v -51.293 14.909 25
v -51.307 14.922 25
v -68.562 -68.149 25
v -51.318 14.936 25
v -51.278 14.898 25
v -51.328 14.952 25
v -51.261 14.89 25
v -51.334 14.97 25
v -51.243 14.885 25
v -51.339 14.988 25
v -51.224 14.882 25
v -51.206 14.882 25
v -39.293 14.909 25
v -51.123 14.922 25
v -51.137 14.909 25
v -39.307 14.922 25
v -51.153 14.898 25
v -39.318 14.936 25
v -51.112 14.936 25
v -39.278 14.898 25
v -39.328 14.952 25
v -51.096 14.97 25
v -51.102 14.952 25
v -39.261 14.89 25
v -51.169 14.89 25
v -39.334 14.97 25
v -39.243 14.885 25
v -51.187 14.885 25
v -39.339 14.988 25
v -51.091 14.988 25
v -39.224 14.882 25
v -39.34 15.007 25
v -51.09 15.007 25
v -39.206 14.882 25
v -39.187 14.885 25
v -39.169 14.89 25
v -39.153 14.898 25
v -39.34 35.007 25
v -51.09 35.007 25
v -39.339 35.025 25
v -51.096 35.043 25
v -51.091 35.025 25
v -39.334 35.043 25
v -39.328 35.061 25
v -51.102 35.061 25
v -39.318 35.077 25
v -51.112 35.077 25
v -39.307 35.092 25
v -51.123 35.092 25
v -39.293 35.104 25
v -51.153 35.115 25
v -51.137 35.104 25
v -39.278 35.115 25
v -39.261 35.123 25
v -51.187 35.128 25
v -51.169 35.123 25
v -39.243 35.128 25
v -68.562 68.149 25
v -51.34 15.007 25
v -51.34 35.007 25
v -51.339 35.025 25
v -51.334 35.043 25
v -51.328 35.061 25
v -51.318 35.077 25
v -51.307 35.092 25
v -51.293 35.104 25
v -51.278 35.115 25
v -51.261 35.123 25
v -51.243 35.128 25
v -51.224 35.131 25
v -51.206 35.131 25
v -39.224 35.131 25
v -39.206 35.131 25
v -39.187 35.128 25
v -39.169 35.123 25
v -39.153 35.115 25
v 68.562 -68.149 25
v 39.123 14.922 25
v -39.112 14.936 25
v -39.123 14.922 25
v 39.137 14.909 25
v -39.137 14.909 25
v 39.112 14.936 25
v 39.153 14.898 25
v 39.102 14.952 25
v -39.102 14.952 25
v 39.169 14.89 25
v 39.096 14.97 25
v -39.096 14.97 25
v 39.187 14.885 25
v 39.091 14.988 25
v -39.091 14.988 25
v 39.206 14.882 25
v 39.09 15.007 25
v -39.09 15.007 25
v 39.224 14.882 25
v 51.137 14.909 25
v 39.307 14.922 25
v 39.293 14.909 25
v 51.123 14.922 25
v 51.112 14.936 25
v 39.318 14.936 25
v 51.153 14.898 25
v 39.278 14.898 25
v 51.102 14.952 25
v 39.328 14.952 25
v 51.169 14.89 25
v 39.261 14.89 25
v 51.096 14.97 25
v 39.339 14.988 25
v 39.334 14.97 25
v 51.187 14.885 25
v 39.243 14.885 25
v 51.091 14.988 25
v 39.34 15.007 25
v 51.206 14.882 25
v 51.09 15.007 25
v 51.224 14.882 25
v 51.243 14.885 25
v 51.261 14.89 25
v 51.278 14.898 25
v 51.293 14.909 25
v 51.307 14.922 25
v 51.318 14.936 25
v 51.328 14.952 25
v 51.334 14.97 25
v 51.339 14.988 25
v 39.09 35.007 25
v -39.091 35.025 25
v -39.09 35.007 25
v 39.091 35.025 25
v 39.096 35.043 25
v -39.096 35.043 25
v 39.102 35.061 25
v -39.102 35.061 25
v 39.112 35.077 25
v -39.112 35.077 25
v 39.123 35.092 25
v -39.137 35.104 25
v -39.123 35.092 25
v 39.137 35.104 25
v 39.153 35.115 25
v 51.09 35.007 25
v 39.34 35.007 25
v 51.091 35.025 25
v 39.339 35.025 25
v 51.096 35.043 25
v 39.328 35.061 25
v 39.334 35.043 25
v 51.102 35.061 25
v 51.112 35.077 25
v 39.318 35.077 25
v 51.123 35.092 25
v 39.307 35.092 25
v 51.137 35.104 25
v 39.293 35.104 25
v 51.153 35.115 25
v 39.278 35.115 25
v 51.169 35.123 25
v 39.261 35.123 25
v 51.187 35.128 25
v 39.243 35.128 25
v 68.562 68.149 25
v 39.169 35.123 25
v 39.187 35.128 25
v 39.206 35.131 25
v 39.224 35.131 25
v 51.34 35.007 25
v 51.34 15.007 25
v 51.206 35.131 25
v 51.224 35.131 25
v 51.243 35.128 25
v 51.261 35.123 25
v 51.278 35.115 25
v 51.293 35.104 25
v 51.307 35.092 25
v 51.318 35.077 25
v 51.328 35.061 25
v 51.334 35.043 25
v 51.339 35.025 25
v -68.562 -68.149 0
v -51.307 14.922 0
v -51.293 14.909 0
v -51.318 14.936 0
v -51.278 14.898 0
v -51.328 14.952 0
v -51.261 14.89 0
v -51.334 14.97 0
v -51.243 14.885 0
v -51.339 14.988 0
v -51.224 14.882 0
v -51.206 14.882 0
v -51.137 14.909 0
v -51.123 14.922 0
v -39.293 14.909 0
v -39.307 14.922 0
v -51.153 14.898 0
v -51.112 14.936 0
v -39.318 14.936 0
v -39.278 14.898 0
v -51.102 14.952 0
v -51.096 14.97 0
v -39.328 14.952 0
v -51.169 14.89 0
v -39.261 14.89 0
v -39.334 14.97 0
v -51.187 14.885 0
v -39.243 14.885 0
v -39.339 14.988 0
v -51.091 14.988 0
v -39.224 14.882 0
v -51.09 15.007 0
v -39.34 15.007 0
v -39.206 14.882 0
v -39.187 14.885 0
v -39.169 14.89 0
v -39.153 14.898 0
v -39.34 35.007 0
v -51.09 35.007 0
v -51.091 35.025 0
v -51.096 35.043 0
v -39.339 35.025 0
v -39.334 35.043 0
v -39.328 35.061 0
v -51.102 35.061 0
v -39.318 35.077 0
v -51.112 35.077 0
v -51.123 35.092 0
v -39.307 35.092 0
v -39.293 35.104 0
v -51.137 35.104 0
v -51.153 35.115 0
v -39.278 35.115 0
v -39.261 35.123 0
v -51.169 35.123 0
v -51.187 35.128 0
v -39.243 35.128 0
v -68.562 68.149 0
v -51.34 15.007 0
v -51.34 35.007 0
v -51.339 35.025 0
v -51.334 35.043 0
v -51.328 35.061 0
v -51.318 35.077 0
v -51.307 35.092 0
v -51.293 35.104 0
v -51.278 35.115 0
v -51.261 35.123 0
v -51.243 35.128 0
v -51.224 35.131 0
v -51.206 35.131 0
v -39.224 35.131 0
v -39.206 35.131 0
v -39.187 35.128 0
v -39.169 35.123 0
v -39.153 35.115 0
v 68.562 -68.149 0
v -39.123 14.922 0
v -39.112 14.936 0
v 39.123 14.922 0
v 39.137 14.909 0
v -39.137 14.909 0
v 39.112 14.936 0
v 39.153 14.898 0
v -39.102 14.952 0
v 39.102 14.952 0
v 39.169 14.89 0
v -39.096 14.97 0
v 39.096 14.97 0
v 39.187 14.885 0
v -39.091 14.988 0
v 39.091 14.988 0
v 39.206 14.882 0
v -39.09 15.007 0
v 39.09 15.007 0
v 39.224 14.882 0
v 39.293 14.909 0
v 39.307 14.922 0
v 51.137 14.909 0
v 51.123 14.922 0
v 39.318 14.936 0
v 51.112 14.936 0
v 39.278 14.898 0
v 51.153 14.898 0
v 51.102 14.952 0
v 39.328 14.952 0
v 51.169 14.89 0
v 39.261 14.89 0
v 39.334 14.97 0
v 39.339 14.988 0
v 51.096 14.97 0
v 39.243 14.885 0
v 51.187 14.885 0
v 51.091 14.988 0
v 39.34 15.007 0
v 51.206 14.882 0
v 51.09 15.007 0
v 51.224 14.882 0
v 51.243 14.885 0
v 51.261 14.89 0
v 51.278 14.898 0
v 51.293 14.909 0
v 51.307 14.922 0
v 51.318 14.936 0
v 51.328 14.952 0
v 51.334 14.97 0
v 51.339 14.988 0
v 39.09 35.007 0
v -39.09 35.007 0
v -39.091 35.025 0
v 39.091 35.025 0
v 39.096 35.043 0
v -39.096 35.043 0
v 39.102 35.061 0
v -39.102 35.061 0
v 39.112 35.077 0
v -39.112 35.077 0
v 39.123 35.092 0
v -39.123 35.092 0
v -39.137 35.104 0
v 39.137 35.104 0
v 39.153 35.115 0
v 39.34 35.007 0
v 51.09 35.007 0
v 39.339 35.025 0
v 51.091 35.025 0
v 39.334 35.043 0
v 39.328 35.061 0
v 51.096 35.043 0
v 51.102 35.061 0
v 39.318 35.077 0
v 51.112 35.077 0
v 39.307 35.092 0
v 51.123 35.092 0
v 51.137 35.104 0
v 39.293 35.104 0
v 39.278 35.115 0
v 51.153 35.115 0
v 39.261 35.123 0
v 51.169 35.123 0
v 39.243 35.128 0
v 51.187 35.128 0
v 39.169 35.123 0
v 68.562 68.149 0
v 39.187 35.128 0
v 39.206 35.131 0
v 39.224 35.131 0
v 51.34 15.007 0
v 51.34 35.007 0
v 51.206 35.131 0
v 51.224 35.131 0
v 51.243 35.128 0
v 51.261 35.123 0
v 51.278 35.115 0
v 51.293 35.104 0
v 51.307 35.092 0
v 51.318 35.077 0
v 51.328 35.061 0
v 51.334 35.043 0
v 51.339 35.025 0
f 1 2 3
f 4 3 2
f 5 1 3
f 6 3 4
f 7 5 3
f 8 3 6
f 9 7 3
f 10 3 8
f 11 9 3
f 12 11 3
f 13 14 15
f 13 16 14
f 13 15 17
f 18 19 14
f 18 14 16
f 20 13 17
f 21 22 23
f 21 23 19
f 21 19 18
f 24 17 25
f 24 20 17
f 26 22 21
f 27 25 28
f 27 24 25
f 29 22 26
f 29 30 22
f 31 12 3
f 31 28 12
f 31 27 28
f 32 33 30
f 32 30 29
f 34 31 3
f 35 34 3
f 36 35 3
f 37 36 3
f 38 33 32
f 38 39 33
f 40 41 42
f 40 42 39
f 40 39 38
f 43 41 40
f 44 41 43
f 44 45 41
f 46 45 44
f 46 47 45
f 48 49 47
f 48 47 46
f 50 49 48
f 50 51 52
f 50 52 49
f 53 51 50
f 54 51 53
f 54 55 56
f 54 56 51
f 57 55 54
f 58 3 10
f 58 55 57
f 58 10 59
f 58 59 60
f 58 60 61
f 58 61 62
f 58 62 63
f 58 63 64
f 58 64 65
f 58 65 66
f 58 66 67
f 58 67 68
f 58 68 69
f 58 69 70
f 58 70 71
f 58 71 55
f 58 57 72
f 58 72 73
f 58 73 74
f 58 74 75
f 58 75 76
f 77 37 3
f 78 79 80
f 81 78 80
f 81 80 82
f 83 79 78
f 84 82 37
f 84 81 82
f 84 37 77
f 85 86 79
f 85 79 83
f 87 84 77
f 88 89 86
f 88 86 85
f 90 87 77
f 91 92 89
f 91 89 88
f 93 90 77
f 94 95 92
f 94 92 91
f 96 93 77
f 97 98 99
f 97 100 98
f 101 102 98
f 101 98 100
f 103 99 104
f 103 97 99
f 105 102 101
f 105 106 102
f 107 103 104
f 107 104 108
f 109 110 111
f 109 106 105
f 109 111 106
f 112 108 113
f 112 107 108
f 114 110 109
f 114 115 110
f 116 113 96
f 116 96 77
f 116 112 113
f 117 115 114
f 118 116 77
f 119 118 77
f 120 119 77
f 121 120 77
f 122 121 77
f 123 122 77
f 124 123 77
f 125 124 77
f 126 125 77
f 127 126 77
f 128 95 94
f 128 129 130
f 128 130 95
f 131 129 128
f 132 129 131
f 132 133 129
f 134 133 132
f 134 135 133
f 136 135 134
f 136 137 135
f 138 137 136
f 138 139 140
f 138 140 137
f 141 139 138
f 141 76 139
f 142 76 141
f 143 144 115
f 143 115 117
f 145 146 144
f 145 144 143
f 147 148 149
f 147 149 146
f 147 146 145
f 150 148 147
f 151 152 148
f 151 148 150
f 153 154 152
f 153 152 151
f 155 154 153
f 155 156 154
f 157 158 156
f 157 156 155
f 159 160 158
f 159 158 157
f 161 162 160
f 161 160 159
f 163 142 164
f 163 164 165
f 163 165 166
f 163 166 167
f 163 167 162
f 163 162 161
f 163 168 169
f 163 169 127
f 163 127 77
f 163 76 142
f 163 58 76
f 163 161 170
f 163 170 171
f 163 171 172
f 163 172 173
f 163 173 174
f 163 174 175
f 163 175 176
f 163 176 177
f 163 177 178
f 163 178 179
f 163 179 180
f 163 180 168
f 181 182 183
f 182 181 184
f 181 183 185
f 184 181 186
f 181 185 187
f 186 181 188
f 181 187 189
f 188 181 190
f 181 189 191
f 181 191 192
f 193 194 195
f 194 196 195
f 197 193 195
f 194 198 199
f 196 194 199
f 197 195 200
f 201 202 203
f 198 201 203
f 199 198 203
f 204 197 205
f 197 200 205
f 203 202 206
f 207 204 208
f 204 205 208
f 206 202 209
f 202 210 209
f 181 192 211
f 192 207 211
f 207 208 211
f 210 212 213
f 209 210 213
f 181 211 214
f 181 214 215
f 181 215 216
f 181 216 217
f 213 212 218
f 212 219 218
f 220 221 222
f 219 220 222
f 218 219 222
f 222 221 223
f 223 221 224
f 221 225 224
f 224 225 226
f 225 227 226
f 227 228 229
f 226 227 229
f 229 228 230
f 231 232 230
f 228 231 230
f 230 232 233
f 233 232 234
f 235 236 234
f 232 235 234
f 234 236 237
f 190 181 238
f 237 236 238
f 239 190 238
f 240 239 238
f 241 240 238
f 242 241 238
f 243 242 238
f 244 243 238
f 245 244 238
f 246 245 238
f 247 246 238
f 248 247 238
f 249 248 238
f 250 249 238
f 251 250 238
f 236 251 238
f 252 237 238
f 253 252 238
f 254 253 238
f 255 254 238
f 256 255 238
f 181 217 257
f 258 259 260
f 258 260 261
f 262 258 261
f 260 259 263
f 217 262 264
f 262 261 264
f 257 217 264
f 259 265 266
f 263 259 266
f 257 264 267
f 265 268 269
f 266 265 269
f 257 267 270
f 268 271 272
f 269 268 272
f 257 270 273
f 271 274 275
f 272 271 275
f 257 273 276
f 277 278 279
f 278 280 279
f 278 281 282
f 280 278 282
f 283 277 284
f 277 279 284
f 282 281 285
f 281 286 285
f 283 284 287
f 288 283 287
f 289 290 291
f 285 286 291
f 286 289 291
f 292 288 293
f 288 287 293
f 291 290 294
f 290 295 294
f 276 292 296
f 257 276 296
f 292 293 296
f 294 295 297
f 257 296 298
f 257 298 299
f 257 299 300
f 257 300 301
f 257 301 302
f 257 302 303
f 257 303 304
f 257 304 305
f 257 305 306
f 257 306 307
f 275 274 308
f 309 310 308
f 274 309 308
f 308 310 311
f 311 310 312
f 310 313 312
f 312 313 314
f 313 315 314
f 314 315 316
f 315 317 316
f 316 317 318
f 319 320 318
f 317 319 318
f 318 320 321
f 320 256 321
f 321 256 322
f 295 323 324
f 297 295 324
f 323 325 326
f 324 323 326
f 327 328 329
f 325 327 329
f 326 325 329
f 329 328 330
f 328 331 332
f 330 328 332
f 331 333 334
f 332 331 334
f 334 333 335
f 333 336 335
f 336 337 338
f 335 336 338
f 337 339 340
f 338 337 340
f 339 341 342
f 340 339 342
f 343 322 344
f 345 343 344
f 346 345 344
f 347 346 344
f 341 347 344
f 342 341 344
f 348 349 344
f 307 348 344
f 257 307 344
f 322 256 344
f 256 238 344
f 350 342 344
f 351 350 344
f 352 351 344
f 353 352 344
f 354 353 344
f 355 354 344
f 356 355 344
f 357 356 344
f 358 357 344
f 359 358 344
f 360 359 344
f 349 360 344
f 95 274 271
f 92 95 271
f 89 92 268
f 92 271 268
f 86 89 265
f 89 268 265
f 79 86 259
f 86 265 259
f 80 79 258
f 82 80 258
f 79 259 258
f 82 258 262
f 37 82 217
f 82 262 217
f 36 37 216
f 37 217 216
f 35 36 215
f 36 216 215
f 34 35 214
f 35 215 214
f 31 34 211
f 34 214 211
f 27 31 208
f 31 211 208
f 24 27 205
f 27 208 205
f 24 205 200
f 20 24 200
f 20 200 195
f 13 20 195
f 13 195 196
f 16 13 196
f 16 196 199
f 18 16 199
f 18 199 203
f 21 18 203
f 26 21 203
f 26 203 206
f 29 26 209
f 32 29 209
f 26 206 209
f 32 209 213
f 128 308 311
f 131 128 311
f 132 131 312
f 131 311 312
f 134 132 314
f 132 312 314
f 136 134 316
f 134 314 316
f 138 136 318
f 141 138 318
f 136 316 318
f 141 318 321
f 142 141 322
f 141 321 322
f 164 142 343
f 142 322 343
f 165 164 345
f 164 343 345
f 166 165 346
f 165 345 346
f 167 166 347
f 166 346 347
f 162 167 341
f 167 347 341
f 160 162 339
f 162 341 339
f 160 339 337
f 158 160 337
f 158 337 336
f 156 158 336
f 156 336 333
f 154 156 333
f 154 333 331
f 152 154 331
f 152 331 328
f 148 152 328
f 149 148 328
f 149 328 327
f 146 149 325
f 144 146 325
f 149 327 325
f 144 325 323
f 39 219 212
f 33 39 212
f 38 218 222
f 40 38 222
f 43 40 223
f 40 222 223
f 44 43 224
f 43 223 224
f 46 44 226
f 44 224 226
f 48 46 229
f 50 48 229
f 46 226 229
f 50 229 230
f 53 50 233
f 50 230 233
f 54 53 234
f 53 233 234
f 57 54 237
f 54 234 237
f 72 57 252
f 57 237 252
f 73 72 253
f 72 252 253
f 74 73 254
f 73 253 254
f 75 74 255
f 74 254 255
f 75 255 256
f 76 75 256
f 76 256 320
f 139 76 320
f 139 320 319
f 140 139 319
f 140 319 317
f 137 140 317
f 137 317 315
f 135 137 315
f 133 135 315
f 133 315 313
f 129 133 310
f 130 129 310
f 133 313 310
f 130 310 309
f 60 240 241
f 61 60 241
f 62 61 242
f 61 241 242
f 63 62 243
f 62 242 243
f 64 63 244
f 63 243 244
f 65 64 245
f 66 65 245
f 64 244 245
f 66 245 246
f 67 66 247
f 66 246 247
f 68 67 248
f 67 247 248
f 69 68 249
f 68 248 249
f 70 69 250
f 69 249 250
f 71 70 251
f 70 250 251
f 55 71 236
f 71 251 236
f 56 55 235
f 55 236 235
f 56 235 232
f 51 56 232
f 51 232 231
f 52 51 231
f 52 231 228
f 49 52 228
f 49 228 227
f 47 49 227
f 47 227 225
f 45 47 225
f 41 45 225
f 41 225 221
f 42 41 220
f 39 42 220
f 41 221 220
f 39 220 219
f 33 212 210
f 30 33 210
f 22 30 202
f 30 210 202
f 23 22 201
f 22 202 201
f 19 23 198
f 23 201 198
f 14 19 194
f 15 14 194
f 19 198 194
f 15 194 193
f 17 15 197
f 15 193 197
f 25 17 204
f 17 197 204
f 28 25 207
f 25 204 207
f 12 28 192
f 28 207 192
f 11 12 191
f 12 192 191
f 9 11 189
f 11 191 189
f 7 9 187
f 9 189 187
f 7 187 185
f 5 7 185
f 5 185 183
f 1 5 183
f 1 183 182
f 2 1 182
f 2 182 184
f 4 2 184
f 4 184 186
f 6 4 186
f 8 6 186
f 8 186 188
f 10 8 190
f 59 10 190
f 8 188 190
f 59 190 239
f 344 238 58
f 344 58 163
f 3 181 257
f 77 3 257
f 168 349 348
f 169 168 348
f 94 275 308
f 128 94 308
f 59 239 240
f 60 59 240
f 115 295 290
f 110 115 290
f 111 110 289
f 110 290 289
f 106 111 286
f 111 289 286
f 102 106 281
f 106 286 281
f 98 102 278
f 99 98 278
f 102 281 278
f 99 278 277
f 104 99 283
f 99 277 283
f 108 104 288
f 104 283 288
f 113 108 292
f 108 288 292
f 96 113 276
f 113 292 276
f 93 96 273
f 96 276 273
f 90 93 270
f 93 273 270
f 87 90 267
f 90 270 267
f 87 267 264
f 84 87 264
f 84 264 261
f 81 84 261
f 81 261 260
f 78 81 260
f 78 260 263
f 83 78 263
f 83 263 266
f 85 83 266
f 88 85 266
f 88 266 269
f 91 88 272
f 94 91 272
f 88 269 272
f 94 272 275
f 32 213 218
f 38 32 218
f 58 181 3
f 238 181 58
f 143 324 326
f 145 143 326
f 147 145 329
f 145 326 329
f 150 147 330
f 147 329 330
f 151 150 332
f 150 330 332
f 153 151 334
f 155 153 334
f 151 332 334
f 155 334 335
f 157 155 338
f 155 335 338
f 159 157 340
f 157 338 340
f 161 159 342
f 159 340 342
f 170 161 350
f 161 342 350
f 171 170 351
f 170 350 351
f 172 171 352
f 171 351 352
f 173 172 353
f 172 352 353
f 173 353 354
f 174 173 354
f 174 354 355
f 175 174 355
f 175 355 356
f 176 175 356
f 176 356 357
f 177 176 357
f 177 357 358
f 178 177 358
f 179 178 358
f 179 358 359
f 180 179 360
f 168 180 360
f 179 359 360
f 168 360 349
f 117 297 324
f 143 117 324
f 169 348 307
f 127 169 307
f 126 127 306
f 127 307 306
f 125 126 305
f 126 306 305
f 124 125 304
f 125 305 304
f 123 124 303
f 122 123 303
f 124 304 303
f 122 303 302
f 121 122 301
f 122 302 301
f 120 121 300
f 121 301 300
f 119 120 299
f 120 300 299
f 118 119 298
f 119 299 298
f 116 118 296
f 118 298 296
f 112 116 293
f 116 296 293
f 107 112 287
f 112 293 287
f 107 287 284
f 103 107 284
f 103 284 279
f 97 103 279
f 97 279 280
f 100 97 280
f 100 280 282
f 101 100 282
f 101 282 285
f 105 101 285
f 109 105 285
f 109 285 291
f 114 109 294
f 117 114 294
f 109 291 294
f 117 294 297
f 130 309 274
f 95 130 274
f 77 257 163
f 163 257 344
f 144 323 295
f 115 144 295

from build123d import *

# Parameters (mm, degrees)
F0_W     = 137.1241360903
F0_H     = 136.2980902195
F1_DEPTH = 25


with BuildPart() as f1:
    # F0 (on Top) → F1 (new body)
    with BuildSketch(Plane.XY):
        Rectangle(F0_W, F0_H)
        with BuildLine():
            Line((-51.3400377035, 15.006557107), (-51.3400377035, 35.006557107))
            ThreePointArc((-51.3400377035, 35.006557107), (-51.2150377035, 35.131557107), (-51.0900377035, 35.006557107))
            Line((-51.0900377035, 35.006557107), (-51.0900377035, 15.006557107))
            ThreePointArc((-51.0900377035, 15.006557107), (-51.2150377035, 14.881557107), (-51.3400377035, 15.006557107))
        make_face(mode=Mode.SUBTRACT)
        with BuildLine():
            Line((-39.3400377035, 15.006557107), (-39.3400377035, 35.006557107))
            ThreePointArc((-39.3400377035, 35.006557107), (-39.2150377035, 35.131557107), (-39.0900377035, 35.006557107))
            Line((-39.0900377035, 35.006557107), (-39.0900377035, 15.006557107))
            ThreePointArc((-39.0900377035, 15.006557107), (-39.2150377035, 14.881557107), (-39.3400377035, 15.006557107))
        make_face(mode=Mode.SUBTRACT)
        with BuildLine():
            ThreePointArc((39.0900377035, 35.006557107), (39.2150377035, 35.131557107), (39.3400377035, 35.006557107))
            Line((39.3400377035, 35.006557107), (39.3400377035, 15.006557107))
            ThreePointArc((39.3400377035, 15.006557107), (39.2150377035, 14.881557107), (39.0900377035, 15.006557107))
            Line((39.0900377035, 15.006557107), (39.0900377035, 35.006557107))
        make_face(mode=Mode.SUBTRACT)
        with BuildLine():
            ThreePointArc((51.3400377035, 15.006557107), (51.2150377035, 14.881557107), (51.0900377035, 15.006557107))
            Line((51.0900377035, 15.006557107), (51.0900377035, 35.006557107))
            ThreePointArc((51.0900377035, 35.006557107), (51.2150377035, 35.131557107), (51.3400377035, 35.006557107))
            Line((51.3400377035, 35.006557107), (51.3400377035, 15.006557107))
        make_face(mode=Mode.SUBTRACT)
    extrude(amount=F1_DEPTH)


solid = f1.part
